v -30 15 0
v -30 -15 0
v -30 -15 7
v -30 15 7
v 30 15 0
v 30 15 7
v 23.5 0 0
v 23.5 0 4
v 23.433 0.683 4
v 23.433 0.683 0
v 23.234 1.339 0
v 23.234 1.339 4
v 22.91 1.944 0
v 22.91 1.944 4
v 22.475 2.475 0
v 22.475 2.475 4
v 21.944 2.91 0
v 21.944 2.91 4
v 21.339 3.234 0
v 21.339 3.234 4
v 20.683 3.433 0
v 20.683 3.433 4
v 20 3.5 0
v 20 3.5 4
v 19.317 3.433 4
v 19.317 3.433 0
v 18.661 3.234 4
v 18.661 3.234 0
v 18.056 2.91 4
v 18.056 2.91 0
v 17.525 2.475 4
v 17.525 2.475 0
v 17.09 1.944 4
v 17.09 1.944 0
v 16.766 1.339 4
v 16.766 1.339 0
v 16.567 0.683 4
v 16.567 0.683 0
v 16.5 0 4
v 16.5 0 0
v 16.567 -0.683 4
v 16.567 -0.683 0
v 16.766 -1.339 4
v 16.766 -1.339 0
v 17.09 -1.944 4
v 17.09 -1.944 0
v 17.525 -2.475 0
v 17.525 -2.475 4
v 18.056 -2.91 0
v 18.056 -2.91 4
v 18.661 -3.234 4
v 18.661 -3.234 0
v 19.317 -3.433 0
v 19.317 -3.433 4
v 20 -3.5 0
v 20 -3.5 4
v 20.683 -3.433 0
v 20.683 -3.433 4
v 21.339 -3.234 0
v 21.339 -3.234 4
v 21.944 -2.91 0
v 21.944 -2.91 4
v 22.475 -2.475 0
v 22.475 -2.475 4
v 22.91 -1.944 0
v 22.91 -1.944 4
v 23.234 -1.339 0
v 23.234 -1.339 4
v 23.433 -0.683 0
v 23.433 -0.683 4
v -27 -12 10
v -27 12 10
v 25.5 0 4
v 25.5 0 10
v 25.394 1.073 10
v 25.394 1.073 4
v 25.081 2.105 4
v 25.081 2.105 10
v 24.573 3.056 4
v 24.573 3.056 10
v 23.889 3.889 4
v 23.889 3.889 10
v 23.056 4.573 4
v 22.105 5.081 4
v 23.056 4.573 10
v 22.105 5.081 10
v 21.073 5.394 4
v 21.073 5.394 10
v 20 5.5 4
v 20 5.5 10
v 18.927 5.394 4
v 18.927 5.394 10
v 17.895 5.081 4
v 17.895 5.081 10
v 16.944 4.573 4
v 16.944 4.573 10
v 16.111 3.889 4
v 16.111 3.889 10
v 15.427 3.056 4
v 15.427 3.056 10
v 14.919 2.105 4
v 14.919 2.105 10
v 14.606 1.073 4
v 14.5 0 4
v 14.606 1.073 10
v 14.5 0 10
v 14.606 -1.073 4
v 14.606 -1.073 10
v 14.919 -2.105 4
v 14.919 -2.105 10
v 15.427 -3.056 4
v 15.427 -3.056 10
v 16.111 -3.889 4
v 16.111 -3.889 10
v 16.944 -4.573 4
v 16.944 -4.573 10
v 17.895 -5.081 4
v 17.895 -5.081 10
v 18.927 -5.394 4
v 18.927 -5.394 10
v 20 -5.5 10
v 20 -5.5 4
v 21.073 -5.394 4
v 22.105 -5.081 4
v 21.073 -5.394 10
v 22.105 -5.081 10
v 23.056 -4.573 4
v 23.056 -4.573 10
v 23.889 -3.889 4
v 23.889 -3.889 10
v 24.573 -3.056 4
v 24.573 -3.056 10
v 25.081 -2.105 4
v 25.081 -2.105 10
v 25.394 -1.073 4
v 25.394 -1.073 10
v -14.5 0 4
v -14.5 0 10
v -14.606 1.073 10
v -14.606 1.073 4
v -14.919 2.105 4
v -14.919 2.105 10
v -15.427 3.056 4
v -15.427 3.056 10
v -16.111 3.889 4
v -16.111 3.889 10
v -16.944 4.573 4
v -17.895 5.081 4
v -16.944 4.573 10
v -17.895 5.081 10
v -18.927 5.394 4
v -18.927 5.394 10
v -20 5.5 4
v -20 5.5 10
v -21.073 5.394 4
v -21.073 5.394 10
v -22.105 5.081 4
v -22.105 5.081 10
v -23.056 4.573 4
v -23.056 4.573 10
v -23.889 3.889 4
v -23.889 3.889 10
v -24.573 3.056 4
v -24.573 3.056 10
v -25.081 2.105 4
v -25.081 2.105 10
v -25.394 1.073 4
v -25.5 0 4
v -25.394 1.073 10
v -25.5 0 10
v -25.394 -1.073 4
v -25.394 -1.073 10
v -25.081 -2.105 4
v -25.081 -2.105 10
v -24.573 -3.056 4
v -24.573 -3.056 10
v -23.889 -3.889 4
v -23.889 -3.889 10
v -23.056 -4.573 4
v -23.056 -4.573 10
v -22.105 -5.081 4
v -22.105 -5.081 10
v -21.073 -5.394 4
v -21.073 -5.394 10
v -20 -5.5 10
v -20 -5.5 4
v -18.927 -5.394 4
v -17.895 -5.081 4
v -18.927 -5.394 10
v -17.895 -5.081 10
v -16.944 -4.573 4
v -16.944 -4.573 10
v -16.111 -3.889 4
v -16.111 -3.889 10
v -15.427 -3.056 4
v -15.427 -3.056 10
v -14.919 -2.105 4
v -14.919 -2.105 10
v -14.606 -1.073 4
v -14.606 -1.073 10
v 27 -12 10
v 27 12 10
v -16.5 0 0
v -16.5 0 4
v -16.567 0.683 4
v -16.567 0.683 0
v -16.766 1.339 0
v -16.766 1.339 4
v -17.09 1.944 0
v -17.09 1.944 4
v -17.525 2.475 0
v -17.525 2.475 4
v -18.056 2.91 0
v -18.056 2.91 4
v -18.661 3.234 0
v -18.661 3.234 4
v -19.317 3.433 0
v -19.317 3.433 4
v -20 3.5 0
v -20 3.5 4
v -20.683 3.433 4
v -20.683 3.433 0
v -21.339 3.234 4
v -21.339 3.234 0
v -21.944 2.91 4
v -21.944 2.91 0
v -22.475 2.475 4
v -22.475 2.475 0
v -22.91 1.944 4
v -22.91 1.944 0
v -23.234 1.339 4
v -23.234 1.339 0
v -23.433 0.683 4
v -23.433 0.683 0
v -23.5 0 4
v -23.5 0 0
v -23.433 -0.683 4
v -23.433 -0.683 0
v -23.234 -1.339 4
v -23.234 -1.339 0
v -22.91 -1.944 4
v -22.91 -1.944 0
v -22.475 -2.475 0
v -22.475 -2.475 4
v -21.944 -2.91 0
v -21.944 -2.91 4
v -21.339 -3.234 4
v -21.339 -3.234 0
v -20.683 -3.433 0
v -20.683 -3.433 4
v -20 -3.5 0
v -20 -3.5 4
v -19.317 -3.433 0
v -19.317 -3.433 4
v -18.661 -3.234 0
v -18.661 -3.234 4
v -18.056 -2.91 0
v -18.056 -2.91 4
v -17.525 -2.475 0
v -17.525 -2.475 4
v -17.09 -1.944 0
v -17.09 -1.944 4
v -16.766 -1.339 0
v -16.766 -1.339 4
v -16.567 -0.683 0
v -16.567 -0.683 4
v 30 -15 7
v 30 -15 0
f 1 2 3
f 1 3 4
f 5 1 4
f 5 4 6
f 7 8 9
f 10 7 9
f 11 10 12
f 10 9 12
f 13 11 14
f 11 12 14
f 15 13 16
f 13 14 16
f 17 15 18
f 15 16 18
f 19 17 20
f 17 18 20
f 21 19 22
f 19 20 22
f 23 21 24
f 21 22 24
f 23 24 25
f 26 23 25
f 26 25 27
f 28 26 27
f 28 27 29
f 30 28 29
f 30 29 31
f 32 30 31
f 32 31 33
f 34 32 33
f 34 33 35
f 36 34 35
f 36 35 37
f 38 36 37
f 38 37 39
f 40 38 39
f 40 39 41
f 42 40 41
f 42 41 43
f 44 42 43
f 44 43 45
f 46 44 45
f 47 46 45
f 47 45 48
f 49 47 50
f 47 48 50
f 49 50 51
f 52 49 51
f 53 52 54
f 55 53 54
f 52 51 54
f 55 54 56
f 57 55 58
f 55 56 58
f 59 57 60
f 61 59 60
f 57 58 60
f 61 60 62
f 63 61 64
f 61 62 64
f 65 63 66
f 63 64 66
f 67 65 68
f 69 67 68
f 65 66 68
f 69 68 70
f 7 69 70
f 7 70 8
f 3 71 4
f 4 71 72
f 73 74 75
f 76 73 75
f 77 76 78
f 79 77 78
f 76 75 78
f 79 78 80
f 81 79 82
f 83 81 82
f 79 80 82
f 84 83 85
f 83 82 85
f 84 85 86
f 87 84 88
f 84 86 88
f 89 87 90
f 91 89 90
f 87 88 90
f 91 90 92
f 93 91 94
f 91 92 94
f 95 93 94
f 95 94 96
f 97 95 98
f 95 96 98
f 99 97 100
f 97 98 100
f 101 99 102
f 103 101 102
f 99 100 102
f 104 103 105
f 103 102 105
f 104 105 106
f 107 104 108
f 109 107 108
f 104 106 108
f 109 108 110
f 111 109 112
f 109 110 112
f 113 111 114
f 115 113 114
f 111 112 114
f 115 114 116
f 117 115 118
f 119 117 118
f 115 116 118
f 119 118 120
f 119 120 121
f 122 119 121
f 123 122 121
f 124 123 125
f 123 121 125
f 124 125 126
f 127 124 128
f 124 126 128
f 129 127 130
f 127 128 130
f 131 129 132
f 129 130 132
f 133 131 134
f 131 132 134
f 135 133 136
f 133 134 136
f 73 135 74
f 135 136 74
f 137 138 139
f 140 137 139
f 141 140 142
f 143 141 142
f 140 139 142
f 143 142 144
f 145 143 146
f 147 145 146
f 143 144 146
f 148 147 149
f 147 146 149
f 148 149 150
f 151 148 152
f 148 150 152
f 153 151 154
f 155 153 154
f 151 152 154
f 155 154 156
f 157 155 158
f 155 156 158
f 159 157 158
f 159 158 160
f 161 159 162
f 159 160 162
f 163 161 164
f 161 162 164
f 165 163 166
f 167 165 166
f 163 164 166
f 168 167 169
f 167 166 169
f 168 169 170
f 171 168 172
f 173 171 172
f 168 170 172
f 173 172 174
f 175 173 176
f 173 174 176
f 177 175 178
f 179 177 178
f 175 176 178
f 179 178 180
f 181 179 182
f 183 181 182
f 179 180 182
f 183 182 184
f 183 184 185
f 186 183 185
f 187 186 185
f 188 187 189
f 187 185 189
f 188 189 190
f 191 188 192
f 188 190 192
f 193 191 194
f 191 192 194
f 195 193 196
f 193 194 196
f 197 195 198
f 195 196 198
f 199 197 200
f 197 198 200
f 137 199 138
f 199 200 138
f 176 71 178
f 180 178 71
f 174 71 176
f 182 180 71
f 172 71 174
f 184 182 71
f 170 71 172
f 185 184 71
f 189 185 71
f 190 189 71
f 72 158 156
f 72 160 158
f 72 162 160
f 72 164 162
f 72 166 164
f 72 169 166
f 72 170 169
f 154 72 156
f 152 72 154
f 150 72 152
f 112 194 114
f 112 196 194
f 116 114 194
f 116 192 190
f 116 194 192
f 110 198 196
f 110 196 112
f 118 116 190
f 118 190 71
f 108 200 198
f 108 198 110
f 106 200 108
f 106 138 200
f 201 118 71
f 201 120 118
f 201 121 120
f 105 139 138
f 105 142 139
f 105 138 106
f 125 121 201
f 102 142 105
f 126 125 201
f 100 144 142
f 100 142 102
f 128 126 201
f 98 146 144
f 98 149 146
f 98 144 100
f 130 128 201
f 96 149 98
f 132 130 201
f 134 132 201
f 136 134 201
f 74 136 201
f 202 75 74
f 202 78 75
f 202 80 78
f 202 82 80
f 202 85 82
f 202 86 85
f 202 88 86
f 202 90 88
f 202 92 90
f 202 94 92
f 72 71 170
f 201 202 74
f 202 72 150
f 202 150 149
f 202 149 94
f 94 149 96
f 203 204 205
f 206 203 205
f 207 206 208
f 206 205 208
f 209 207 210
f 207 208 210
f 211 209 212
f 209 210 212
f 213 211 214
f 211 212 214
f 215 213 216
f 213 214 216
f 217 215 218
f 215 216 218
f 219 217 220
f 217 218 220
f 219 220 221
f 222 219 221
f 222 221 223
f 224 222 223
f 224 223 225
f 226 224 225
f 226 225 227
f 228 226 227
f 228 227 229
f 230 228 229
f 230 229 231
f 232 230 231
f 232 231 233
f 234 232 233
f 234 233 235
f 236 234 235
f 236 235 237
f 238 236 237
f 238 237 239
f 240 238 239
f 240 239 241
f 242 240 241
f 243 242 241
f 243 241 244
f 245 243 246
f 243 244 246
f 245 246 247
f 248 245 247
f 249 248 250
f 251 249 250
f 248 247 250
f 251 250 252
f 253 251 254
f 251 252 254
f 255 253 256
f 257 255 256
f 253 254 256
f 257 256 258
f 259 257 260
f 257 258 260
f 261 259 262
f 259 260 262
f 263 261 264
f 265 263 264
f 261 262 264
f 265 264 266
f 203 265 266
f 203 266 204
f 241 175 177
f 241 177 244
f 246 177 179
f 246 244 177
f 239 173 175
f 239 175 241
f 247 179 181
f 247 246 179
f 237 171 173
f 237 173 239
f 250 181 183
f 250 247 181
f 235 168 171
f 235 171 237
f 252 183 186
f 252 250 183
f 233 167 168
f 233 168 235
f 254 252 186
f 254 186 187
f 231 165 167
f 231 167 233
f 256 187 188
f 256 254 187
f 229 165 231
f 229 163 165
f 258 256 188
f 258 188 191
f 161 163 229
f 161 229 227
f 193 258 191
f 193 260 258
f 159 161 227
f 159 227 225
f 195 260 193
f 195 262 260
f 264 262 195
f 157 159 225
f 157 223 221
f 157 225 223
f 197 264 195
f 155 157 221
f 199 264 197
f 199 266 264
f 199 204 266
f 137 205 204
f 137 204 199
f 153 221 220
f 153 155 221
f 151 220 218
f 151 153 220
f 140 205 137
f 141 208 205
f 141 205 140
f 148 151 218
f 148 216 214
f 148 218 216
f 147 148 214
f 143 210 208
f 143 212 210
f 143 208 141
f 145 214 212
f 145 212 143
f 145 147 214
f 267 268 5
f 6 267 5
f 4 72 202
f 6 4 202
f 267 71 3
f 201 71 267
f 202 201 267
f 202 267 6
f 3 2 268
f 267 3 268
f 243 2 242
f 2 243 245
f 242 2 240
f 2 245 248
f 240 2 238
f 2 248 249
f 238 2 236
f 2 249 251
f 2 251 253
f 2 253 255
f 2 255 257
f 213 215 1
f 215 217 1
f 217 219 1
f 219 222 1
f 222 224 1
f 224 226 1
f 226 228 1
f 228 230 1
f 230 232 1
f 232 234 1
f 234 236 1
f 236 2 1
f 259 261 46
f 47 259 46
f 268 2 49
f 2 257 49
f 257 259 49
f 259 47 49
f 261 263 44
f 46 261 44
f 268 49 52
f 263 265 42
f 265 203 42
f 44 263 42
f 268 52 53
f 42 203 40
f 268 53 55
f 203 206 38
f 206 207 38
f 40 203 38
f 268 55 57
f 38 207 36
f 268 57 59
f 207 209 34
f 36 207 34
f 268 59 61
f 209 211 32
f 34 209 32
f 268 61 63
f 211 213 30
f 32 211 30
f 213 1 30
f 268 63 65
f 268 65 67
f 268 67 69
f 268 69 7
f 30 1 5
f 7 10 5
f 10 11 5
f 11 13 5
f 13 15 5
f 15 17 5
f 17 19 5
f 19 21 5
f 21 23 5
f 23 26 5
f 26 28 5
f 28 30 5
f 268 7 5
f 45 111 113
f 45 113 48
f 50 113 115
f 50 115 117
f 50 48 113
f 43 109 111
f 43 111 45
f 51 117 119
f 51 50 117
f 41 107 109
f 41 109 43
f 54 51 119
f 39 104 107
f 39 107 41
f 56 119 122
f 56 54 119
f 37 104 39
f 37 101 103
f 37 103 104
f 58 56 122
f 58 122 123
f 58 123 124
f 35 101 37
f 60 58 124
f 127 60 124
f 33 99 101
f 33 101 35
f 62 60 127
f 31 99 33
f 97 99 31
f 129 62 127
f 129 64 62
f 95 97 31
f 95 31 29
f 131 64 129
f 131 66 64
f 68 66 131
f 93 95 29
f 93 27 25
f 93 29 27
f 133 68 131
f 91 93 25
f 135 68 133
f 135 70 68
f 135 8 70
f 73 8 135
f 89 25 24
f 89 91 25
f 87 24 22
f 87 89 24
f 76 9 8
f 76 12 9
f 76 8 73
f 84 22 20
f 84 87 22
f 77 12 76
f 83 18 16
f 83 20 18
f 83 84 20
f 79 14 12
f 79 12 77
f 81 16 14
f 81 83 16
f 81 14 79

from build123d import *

# Parameters (mm, degrees)
SKETCH_1_W          = 60
SKETCH_1_H          = 30
EXTRUDE_1_DEPTH     = 10
CHAMFER_1_SIZE      = 3
SKETCH_2_R          = 3.5
CUT_EXTRUDE_1_DEPTH = 36
SKETCH_3_R          = 5.5
CUT_EXTRUDE_2_DEPTH = 6


with BuildPart() as part:
    # 草图1 → 凸台-拉伸1 (new body)
    with BuildSketch(Plane.XY):
        Rectangle(SKETCH_1_W, SKETCH_1_H)
    extrude(amount=EXTRUDE_1_DEPTH)

    # 倒角1
    chamfer_1_edges = [part.edges().sort_by_distance(p)[0] for p in [
        (-30, 0, 10),
        (0, -15, 10),
        (30, 0, 10),
        (0, 15, 10),
    ]]
    chamfer(chamfer_1_edges, length=CHAMFER_1_SIZE)

    # 草图2 → 切除-拉伸1 (cut, through all)
    with BuildSketch(Plane.XY.offset(10)):
        with Locations((-20, 0)):
            Circle(SKETCH_2_R)
        with Locations((20, 0)):
            Circle(SKETCH_2_R)
    extrude(amount=-CUT_EXTRUDE_1_DEPTH, mode=Mode.SUBTRACT)

    # 草图3 → 切除-拉伸2 (cut)
    with BuildSketch(Plane.XY.offset(10)):
        with Locations((-20, 0)):
            Circle(SKETCH_3_R)
        with Locations((20, 0)):
            Circle(SKETCH_3_R)
    extrude(amount=-CUT_EXTRUDE_2_DEPTH, mode=Mode.SUBTRACT)


solid = part.part
